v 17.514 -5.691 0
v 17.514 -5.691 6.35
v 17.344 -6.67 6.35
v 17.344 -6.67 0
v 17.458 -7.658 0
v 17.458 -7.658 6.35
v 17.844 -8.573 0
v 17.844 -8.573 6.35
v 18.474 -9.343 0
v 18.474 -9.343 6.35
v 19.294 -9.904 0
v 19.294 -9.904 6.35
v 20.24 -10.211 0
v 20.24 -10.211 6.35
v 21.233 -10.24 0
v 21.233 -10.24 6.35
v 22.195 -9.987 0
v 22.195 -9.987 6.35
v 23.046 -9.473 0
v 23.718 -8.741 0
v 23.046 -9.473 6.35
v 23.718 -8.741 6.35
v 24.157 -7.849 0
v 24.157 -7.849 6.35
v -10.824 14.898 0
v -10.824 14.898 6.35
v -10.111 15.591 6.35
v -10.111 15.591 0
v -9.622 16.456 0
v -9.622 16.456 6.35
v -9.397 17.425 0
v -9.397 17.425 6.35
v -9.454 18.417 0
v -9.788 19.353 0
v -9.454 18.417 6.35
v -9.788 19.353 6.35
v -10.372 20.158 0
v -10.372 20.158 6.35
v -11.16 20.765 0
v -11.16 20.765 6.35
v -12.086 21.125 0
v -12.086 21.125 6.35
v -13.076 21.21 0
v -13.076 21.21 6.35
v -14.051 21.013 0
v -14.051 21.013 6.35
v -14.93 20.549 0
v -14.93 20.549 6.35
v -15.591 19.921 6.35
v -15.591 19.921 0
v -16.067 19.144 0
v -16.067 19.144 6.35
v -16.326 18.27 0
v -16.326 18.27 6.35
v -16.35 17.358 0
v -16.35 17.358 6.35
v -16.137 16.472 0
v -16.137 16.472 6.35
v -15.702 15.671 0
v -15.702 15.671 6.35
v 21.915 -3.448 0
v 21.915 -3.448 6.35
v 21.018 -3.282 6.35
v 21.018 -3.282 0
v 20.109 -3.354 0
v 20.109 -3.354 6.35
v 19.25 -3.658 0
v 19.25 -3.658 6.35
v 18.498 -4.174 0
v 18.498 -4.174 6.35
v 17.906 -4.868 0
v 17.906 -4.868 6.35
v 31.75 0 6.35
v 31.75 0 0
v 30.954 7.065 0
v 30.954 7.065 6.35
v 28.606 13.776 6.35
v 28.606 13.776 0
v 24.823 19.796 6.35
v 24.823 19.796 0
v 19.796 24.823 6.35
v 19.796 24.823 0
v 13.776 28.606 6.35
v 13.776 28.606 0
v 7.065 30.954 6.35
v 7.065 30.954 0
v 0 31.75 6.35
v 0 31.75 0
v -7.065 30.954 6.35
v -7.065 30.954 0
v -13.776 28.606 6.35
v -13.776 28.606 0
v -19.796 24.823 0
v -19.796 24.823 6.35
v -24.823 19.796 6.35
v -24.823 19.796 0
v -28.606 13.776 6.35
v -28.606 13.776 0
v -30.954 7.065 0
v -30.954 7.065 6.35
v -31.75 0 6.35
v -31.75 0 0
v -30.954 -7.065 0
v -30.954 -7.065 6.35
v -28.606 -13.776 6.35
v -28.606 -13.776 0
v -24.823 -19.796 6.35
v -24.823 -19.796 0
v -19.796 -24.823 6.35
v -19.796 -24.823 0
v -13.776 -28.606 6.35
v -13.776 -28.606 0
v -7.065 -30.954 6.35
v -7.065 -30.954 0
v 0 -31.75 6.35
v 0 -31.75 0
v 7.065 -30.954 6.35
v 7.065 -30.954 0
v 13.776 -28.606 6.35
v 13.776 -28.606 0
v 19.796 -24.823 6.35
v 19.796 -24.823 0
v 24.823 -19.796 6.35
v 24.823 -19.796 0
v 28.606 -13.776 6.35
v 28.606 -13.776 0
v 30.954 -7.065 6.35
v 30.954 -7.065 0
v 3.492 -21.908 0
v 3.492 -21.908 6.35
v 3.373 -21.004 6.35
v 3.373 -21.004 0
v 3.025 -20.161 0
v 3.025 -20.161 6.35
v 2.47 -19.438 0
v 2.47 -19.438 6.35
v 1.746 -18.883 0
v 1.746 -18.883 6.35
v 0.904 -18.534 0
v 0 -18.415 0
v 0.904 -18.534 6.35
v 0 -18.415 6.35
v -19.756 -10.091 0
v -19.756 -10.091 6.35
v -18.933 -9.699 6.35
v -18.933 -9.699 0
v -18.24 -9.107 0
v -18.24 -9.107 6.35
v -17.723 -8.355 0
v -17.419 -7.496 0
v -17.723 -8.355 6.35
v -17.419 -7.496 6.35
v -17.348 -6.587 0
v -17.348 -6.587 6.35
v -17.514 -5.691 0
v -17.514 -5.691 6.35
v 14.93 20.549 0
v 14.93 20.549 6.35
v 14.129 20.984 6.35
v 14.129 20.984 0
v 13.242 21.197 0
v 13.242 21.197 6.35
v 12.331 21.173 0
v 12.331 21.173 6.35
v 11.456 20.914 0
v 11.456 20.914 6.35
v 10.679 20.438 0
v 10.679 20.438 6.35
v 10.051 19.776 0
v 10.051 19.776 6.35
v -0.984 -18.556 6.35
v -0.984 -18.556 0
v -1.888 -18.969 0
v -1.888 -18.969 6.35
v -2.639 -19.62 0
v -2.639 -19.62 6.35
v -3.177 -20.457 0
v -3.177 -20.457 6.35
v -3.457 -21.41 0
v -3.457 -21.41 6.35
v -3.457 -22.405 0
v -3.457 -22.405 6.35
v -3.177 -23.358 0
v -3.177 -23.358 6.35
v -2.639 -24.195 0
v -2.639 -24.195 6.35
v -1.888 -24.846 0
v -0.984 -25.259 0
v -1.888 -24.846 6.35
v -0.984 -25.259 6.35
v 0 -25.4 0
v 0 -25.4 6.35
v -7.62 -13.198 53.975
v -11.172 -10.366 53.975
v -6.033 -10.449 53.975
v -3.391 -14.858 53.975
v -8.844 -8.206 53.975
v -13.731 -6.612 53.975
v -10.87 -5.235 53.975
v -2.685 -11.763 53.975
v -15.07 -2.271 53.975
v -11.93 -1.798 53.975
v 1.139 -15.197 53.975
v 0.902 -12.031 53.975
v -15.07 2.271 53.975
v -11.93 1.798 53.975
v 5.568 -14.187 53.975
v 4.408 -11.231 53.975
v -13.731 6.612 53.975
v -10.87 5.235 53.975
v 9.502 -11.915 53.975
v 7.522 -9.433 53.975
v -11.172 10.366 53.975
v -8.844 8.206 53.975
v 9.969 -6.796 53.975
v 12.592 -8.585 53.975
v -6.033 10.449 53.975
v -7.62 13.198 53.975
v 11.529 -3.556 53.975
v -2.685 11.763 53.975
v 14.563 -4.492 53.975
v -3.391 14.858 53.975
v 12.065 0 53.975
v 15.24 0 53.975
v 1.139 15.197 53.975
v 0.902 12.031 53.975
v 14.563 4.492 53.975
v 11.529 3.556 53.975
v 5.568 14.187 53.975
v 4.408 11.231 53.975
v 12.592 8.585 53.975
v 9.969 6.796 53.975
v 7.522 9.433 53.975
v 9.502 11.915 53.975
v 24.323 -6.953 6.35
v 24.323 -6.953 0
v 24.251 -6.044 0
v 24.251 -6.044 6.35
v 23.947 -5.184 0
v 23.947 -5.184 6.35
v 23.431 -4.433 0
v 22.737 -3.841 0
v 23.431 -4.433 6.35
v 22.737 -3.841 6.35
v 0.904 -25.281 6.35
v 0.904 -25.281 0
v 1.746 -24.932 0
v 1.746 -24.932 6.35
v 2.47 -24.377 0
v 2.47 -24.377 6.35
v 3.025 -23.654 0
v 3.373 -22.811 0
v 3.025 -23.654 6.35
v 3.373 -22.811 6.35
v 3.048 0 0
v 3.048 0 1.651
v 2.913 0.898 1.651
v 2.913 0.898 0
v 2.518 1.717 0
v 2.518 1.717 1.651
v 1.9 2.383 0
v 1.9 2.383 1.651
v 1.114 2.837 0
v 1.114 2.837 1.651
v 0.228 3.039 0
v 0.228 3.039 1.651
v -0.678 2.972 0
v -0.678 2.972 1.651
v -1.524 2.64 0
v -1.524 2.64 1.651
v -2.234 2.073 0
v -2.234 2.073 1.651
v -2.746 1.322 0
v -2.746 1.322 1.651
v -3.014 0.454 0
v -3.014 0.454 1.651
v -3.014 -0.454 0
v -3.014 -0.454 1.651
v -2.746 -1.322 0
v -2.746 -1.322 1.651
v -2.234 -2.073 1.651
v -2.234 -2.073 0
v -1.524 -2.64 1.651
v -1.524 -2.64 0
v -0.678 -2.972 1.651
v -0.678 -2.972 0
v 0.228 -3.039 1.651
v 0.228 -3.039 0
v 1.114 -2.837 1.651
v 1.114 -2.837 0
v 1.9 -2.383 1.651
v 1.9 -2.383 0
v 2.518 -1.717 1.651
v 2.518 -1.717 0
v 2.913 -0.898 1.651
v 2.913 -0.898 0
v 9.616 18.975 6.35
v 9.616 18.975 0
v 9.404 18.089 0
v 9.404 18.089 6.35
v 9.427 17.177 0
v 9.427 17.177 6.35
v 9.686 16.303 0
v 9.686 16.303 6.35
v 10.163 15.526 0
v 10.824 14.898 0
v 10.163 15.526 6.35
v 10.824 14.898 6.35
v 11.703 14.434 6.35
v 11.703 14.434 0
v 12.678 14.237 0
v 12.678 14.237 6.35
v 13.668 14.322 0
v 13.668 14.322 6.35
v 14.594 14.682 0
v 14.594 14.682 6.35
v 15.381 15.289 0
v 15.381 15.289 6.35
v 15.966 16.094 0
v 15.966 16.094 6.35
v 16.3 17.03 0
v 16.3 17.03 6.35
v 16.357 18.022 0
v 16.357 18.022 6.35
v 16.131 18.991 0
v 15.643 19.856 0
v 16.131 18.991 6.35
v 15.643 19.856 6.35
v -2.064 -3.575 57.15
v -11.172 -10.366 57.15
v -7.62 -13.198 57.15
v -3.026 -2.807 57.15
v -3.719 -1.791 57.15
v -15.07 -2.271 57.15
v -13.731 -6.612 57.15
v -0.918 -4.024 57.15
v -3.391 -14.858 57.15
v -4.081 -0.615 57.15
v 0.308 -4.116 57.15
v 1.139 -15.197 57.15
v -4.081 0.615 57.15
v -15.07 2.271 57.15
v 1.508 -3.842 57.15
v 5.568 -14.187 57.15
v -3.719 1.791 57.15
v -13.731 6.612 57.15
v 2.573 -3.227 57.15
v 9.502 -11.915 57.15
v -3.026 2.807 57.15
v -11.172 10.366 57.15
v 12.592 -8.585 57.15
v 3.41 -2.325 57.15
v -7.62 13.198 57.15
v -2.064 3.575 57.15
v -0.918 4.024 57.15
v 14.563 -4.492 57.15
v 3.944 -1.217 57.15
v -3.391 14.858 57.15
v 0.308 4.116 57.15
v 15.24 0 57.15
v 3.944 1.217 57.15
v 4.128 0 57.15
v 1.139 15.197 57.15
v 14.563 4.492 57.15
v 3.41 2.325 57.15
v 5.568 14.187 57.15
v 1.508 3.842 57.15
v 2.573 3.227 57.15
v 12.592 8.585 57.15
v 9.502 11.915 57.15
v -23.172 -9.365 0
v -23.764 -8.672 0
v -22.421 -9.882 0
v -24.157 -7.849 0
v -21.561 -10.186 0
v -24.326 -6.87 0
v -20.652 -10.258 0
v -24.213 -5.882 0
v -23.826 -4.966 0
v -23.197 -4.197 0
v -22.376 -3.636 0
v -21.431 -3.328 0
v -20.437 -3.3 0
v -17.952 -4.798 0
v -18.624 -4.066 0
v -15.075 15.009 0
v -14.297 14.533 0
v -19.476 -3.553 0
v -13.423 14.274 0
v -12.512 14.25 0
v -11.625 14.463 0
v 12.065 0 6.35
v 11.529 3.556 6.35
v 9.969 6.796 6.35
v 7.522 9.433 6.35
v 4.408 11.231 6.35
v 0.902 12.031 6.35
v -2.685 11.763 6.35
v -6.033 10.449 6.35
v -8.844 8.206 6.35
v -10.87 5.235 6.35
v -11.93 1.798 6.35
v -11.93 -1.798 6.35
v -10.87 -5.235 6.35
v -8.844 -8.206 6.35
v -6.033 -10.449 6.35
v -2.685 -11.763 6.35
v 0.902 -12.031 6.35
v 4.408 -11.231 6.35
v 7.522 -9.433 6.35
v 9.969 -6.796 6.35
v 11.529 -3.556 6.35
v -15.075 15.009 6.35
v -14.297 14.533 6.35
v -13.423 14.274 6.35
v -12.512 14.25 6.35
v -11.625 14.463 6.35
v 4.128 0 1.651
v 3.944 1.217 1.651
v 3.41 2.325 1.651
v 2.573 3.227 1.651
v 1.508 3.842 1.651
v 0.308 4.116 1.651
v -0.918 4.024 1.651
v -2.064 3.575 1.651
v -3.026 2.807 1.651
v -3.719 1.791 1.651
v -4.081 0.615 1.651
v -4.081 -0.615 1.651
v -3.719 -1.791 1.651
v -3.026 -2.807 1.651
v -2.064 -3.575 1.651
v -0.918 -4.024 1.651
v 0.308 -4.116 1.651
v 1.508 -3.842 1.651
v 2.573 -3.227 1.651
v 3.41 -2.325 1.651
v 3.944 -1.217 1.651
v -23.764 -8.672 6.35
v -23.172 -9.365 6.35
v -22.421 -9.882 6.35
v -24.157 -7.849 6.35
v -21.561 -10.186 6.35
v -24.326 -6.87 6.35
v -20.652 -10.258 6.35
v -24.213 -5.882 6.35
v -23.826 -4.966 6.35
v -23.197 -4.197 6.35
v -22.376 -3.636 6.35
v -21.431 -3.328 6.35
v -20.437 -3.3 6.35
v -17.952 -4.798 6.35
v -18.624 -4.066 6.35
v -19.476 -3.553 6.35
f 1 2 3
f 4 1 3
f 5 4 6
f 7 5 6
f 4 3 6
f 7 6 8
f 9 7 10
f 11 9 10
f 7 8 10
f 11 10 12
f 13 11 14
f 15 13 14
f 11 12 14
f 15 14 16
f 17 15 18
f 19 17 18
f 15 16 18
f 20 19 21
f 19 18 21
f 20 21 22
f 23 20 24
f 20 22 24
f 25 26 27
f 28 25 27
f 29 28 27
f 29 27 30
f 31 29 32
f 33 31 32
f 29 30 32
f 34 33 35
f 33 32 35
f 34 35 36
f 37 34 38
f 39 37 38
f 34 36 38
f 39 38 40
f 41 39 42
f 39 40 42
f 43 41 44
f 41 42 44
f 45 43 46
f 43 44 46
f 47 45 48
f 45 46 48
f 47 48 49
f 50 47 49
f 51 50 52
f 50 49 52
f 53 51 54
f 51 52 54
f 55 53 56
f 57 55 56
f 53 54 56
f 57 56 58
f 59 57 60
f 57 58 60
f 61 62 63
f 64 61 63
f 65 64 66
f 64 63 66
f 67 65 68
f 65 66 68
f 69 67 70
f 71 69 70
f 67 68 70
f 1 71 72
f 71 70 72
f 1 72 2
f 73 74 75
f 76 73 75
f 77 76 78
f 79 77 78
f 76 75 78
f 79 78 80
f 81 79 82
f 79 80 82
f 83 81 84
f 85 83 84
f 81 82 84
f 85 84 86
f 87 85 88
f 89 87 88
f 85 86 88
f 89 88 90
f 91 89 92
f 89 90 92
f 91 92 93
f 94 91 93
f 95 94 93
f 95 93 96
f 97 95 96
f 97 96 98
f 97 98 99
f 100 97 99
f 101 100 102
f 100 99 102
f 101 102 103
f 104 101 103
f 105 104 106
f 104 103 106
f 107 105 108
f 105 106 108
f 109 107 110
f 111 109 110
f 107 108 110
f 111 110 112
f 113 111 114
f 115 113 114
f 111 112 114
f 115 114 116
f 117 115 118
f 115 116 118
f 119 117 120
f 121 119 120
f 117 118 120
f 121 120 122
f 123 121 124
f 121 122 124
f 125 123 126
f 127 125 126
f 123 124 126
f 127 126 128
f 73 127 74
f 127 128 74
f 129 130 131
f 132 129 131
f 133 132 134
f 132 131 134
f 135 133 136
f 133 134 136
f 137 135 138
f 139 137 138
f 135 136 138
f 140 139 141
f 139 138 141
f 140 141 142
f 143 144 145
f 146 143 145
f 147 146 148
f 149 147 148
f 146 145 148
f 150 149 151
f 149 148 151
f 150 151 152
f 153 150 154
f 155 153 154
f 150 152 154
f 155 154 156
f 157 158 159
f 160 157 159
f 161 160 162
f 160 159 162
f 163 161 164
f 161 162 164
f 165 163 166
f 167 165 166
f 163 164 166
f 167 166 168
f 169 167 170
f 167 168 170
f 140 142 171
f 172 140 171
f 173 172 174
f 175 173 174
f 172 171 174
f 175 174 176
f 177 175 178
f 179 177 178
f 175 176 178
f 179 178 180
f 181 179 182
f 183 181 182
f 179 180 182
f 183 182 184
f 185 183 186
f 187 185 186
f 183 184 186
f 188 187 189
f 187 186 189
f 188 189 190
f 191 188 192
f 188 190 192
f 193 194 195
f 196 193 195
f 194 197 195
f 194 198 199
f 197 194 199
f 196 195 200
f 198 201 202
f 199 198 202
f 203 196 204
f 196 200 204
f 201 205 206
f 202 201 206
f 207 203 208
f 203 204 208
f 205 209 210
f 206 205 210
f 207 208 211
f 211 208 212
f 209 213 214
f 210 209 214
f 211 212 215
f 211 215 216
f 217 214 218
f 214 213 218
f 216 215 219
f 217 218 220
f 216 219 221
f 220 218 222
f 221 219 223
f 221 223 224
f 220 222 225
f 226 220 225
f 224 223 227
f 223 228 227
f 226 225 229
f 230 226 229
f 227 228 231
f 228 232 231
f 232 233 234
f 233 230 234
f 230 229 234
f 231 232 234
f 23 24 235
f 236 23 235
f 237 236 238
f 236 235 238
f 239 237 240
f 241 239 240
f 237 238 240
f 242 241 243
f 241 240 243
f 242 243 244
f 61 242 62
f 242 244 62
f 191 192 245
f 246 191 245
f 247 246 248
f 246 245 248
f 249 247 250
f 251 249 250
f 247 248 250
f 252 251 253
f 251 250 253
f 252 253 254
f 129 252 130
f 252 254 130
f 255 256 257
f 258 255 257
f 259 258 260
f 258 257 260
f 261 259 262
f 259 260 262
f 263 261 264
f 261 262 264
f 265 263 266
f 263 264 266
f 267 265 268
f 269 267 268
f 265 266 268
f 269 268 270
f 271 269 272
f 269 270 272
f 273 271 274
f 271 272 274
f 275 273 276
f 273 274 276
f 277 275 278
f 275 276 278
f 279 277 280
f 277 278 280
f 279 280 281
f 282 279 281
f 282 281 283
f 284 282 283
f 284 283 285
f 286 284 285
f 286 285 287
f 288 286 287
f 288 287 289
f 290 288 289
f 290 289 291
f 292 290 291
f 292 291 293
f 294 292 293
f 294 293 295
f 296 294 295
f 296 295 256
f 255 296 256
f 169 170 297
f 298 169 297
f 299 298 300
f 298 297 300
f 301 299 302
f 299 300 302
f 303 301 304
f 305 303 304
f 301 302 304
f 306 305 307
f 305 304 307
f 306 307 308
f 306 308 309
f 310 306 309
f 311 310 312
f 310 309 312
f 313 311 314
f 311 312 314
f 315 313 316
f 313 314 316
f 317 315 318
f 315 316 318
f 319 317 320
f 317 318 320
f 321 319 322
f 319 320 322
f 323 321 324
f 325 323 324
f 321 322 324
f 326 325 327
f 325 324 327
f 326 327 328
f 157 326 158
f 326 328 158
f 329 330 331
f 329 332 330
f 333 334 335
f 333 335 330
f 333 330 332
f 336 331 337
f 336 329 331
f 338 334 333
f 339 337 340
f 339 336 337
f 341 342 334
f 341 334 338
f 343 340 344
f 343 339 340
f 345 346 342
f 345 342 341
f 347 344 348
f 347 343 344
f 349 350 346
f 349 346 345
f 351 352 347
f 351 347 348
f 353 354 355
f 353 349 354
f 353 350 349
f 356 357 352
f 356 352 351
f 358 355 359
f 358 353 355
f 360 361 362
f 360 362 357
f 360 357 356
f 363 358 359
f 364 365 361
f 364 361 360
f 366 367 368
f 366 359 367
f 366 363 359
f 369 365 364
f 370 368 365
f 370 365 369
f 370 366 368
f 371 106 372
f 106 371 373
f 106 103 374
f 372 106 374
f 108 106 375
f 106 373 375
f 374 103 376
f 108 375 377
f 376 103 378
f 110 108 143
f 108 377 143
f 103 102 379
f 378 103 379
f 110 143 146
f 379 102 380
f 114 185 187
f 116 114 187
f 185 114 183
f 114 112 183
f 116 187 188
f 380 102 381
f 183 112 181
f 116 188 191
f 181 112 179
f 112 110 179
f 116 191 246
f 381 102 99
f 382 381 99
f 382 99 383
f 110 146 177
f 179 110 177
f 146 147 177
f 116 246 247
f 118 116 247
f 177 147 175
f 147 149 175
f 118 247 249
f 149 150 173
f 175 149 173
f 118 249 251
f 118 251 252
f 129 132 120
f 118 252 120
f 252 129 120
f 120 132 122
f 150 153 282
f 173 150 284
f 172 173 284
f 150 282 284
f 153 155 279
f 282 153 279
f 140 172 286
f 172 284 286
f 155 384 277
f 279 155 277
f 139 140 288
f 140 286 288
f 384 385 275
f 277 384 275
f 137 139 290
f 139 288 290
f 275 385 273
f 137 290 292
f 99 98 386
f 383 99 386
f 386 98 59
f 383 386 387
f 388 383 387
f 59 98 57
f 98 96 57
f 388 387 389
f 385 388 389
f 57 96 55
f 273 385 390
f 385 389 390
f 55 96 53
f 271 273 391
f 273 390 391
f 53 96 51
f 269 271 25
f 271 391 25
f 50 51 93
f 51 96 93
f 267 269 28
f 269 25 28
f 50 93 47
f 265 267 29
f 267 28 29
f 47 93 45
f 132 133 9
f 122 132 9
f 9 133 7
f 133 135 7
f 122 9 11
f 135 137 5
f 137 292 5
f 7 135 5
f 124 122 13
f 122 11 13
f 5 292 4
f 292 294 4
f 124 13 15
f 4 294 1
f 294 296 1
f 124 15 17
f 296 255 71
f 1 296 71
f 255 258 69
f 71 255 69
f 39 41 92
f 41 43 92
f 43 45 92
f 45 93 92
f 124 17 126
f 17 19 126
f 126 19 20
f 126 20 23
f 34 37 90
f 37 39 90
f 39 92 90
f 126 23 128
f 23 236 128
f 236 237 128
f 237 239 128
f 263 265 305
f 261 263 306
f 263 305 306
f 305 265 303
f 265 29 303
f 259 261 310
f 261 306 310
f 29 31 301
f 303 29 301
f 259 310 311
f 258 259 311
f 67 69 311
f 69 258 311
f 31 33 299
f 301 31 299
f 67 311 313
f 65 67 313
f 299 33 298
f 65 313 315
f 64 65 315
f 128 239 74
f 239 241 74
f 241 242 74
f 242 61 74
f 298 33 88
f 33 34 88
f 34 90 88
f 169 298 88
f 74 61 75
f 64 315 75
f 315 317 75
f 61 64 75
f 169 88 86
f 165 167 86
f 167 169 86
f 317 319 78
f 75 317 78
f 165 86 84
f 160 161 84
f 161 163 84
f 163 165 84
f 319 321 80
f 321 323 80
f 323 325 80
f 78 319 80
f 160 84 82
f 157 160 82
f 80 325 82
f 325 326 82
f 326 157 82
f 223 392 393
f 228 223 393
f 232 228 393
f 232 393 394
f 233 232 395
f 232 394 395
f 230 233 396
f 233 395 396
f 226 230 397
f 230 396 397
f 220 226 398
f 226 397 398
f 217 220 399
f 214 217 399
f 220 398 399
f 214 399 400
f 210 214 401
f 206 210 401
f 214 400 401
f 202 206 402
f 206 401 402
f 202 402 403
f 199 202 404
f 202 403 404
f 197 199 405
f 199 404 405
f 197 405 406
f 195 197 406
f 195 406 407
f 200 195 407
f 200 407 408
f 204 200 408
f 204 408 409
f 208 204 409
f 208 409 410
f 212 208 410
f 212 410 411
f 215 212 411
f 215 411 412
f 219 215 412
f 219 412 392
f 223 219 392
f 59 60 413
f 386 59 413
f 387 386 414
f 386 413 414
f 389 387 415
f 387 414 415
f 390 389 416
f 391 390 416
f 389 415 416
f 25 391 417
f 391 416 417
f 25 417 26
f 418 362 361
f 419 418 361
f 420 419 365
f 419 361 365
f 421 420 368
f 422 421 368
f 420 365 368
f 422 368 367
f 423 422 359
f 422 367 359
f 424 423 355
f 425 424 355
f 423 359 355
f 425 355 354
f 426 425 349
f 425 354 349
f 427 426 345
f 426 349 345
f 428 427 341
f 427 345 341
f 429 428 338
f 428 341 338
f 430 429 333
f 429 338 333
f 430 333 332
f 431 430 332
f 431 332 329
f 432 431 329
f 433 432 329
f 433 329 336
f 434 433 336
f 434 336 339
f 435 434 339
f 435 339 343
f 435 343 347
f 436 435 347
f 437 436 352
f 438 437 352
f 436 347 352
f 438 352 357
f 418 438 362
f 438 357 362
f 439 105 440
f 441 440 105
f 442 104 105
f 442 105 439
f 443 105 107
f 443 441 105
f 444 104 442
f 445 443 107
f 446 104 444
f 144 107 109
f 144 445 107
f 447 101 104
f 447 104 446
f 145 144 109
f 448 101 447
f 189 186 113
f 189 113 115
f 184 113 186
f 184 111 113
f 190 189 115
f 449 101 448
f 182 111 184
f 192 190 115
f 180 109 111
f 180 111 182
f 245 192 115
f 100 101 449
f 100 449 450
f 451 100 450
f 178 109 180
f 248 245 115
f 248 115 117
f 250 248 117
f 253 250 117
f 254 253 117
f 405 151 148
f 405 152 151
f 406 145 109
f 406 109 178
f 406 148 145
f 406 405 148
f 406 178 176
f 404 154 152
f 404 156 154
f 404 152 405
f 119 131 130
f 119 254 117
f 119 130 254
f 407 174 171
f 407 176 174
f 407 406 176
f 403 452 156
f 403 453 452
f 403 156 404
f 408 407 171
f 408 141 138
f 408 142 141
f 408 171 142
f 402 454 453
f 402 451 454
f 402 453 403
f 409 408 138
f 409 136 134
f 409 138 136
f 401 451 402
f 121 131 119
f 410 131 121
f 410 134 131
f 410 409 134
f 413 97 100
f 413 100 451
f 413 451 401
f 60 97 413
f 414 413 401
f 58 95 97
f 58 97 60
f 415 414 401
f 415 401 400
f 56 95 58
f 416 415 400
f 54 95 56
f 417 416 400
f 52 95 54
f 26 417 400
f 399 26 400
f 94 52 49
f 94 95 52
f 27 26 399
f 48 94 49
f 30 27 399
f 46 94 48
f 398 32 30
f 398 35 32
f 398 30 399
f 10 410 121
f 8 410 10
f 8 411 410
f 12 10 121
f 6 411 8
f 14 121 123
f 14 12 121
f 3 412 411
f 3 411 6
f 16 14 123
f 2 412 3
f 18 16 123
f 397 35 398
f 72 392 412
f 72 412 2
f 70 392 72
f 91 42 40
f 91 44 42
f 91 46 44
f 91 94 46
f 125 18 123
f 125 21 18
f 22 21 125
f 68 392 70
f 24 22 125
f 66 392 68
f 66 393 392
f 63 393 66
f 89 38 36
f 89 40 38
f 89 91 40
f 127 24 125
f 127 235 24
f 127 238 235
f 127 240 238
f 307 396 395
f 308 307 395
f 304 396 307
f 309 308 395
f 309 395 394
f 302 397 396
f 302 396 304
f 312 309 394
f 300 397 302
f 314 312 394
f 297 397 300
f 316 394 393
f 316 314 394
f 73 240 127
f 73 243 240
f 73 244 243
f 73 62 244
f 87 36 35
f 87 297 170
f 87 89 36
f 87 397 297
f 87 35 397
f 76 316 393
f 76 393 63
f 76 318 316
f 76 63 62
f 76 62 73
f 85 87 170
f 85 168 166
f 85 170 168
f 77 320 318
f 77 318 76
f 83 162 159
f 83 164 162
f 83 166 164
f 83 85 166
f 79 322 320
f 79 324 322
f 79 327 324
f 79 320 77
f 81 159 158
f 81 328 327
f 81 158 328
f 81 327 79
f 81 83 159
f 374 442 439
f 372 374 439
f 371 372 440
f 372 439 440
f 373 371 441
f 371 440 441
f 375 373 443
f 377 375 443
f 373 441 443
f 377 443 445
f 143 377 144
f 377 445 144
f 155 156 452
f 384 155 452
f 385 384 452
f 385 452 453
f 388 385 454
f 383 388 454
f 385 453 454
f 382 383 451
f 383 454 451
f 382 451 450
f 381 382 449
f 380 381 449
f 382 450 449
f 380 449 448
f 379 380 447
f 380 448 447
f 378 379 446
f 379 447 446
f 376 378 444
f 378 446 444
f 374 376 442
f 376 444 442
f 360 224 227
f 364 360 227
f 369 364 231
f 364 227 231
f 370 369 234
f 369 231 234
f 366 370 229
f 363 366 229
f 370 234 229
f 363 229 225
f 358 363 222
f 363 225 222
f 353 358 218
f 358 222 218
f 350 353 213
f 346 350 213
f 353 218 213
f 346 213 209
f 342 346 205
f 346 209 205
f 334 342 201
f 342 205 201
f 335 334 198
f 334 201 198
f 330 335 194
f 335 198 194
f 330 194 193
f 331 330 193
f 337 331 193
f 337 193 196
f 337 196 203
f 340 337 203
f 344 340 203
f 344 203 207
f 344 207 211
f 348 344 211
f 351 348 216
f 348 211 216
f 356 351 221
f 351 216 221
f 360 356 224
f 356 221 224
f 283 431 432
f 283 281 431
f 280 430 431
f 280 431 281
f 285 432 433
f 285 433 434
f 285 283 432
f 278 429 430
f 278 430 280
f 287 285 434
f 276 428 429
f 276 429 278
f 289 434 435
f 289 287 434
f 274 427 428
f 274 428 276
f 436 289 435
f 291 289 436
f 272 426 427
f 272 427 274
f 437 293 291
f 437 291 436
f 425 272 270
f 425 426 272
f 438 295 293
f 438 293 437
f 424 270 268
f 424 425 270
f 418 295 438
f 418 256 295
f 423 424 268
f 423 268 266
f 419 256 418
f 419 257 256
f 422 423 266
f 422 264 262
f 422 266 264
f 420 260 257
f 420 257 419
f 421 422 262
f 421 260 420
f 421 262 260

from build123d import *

# Parameters (mm, degrees)
SKETCH1_R           = 31.75
BOSS_EXTRUDE1_DEPTH = 6.35
SKETCH2_R           = 12.065
BOSS_EXTRUDE2_DEPTH = 50.8
BOSS_EXTRUDE3_START = -3.175
SKETCH4_R           = 15.24
SKETCH4_R_2         = 12.065
BOSS_EXTRUDE3_DEPTH = 3.175
SKETCH5_R           = 3.4925
CUT_EXTRUDE1_DEPTH  = 68.7994469
CIRPATTERN1_COUNT   = 5
SKETCH6_R           = 3.048
CUT_EXTRUDE2_DEPTH  = 73.679071953
SKETCH6_3_R         = 4.1275
SKETCH6_3_R_2       = 3.048
CUT_EXTRUDE3_DEPTH  = 55.499


with BuildPart() as part:
    # Sketch1 → Boss-Extrude1 (new body)
    with BuildSketch(Plane.XY):
        Circle(SKETCH1_R)
    extrude(amount=BOSS_EXTRUDE1_DEPTH)

    # Sketch2 → Boss-Extrude2 (add)
    with BuildSketch(Plane.XY.offset(6.35)):
        Circle(SKETCH2_R)
    extrude(amount=BOSS_EXTRUDE2_DEPTH)

    # Sketch4 → Boss-Extrude3 (add)
    with BuildSketch(Plane.XY.offset(57.15).offset(BOSS_EXTRUDE3_START)):
        Circle(SKETCH4_R)
        Circle(SKETCH4_R_2, mode=Mode.SUBTRACT)
    extrude(amount=BOSS_EXTRUDE3_DEPTH)

    # Sketch5 → Cut-Extrude1 (cut, through all)
    with BuildSketch(Plane.XY.offset(6.35)):
        with Locations((0, -21.9075)):
            Circle(SKETCH5_R)
    cut_extrude1 = extrude(amount=-CUT_EXTRUDE1_DEPTH, mode=Mode.SUBTRACT)

    # CirPattern1: Cut-Extrude1 ×5 about axis
    cirpattern1_axis = Axis((0, 0, 6.35), (0, 0, 1))
    for i in range(1, CIRPATTERN1_COUNT):
        add(cut_extrude1.rotate(cirpattern1_axis, i * 360 / CIRPATTERN1_COUNT), mode=Mode.SUBTRACT)

    # Sketch6 → Cut-Extrude2 (cut, through all)
    with BuildSketch(Plane.XY.offset(57.15)):
        Circle(SKETCH6_R)
    extrude(amount=-CUT_EXTRUDE2_DEPTH, mode=Mode.SUBTRACT)

    # Sketch6<3> → Cut-Extrude3 (cut)
    with BuildSketch(Plane.XY.offset(57.15)):
        Circle(SKETCH6_3_R)
        Circle(SKETCH6_3_R_2, mode=Mode.SUBTRACT)
    extrude(amount=-CUT_EXTRUDE3_DEPTH, mode=Mode.SUBTRACT)


solid = part.part
